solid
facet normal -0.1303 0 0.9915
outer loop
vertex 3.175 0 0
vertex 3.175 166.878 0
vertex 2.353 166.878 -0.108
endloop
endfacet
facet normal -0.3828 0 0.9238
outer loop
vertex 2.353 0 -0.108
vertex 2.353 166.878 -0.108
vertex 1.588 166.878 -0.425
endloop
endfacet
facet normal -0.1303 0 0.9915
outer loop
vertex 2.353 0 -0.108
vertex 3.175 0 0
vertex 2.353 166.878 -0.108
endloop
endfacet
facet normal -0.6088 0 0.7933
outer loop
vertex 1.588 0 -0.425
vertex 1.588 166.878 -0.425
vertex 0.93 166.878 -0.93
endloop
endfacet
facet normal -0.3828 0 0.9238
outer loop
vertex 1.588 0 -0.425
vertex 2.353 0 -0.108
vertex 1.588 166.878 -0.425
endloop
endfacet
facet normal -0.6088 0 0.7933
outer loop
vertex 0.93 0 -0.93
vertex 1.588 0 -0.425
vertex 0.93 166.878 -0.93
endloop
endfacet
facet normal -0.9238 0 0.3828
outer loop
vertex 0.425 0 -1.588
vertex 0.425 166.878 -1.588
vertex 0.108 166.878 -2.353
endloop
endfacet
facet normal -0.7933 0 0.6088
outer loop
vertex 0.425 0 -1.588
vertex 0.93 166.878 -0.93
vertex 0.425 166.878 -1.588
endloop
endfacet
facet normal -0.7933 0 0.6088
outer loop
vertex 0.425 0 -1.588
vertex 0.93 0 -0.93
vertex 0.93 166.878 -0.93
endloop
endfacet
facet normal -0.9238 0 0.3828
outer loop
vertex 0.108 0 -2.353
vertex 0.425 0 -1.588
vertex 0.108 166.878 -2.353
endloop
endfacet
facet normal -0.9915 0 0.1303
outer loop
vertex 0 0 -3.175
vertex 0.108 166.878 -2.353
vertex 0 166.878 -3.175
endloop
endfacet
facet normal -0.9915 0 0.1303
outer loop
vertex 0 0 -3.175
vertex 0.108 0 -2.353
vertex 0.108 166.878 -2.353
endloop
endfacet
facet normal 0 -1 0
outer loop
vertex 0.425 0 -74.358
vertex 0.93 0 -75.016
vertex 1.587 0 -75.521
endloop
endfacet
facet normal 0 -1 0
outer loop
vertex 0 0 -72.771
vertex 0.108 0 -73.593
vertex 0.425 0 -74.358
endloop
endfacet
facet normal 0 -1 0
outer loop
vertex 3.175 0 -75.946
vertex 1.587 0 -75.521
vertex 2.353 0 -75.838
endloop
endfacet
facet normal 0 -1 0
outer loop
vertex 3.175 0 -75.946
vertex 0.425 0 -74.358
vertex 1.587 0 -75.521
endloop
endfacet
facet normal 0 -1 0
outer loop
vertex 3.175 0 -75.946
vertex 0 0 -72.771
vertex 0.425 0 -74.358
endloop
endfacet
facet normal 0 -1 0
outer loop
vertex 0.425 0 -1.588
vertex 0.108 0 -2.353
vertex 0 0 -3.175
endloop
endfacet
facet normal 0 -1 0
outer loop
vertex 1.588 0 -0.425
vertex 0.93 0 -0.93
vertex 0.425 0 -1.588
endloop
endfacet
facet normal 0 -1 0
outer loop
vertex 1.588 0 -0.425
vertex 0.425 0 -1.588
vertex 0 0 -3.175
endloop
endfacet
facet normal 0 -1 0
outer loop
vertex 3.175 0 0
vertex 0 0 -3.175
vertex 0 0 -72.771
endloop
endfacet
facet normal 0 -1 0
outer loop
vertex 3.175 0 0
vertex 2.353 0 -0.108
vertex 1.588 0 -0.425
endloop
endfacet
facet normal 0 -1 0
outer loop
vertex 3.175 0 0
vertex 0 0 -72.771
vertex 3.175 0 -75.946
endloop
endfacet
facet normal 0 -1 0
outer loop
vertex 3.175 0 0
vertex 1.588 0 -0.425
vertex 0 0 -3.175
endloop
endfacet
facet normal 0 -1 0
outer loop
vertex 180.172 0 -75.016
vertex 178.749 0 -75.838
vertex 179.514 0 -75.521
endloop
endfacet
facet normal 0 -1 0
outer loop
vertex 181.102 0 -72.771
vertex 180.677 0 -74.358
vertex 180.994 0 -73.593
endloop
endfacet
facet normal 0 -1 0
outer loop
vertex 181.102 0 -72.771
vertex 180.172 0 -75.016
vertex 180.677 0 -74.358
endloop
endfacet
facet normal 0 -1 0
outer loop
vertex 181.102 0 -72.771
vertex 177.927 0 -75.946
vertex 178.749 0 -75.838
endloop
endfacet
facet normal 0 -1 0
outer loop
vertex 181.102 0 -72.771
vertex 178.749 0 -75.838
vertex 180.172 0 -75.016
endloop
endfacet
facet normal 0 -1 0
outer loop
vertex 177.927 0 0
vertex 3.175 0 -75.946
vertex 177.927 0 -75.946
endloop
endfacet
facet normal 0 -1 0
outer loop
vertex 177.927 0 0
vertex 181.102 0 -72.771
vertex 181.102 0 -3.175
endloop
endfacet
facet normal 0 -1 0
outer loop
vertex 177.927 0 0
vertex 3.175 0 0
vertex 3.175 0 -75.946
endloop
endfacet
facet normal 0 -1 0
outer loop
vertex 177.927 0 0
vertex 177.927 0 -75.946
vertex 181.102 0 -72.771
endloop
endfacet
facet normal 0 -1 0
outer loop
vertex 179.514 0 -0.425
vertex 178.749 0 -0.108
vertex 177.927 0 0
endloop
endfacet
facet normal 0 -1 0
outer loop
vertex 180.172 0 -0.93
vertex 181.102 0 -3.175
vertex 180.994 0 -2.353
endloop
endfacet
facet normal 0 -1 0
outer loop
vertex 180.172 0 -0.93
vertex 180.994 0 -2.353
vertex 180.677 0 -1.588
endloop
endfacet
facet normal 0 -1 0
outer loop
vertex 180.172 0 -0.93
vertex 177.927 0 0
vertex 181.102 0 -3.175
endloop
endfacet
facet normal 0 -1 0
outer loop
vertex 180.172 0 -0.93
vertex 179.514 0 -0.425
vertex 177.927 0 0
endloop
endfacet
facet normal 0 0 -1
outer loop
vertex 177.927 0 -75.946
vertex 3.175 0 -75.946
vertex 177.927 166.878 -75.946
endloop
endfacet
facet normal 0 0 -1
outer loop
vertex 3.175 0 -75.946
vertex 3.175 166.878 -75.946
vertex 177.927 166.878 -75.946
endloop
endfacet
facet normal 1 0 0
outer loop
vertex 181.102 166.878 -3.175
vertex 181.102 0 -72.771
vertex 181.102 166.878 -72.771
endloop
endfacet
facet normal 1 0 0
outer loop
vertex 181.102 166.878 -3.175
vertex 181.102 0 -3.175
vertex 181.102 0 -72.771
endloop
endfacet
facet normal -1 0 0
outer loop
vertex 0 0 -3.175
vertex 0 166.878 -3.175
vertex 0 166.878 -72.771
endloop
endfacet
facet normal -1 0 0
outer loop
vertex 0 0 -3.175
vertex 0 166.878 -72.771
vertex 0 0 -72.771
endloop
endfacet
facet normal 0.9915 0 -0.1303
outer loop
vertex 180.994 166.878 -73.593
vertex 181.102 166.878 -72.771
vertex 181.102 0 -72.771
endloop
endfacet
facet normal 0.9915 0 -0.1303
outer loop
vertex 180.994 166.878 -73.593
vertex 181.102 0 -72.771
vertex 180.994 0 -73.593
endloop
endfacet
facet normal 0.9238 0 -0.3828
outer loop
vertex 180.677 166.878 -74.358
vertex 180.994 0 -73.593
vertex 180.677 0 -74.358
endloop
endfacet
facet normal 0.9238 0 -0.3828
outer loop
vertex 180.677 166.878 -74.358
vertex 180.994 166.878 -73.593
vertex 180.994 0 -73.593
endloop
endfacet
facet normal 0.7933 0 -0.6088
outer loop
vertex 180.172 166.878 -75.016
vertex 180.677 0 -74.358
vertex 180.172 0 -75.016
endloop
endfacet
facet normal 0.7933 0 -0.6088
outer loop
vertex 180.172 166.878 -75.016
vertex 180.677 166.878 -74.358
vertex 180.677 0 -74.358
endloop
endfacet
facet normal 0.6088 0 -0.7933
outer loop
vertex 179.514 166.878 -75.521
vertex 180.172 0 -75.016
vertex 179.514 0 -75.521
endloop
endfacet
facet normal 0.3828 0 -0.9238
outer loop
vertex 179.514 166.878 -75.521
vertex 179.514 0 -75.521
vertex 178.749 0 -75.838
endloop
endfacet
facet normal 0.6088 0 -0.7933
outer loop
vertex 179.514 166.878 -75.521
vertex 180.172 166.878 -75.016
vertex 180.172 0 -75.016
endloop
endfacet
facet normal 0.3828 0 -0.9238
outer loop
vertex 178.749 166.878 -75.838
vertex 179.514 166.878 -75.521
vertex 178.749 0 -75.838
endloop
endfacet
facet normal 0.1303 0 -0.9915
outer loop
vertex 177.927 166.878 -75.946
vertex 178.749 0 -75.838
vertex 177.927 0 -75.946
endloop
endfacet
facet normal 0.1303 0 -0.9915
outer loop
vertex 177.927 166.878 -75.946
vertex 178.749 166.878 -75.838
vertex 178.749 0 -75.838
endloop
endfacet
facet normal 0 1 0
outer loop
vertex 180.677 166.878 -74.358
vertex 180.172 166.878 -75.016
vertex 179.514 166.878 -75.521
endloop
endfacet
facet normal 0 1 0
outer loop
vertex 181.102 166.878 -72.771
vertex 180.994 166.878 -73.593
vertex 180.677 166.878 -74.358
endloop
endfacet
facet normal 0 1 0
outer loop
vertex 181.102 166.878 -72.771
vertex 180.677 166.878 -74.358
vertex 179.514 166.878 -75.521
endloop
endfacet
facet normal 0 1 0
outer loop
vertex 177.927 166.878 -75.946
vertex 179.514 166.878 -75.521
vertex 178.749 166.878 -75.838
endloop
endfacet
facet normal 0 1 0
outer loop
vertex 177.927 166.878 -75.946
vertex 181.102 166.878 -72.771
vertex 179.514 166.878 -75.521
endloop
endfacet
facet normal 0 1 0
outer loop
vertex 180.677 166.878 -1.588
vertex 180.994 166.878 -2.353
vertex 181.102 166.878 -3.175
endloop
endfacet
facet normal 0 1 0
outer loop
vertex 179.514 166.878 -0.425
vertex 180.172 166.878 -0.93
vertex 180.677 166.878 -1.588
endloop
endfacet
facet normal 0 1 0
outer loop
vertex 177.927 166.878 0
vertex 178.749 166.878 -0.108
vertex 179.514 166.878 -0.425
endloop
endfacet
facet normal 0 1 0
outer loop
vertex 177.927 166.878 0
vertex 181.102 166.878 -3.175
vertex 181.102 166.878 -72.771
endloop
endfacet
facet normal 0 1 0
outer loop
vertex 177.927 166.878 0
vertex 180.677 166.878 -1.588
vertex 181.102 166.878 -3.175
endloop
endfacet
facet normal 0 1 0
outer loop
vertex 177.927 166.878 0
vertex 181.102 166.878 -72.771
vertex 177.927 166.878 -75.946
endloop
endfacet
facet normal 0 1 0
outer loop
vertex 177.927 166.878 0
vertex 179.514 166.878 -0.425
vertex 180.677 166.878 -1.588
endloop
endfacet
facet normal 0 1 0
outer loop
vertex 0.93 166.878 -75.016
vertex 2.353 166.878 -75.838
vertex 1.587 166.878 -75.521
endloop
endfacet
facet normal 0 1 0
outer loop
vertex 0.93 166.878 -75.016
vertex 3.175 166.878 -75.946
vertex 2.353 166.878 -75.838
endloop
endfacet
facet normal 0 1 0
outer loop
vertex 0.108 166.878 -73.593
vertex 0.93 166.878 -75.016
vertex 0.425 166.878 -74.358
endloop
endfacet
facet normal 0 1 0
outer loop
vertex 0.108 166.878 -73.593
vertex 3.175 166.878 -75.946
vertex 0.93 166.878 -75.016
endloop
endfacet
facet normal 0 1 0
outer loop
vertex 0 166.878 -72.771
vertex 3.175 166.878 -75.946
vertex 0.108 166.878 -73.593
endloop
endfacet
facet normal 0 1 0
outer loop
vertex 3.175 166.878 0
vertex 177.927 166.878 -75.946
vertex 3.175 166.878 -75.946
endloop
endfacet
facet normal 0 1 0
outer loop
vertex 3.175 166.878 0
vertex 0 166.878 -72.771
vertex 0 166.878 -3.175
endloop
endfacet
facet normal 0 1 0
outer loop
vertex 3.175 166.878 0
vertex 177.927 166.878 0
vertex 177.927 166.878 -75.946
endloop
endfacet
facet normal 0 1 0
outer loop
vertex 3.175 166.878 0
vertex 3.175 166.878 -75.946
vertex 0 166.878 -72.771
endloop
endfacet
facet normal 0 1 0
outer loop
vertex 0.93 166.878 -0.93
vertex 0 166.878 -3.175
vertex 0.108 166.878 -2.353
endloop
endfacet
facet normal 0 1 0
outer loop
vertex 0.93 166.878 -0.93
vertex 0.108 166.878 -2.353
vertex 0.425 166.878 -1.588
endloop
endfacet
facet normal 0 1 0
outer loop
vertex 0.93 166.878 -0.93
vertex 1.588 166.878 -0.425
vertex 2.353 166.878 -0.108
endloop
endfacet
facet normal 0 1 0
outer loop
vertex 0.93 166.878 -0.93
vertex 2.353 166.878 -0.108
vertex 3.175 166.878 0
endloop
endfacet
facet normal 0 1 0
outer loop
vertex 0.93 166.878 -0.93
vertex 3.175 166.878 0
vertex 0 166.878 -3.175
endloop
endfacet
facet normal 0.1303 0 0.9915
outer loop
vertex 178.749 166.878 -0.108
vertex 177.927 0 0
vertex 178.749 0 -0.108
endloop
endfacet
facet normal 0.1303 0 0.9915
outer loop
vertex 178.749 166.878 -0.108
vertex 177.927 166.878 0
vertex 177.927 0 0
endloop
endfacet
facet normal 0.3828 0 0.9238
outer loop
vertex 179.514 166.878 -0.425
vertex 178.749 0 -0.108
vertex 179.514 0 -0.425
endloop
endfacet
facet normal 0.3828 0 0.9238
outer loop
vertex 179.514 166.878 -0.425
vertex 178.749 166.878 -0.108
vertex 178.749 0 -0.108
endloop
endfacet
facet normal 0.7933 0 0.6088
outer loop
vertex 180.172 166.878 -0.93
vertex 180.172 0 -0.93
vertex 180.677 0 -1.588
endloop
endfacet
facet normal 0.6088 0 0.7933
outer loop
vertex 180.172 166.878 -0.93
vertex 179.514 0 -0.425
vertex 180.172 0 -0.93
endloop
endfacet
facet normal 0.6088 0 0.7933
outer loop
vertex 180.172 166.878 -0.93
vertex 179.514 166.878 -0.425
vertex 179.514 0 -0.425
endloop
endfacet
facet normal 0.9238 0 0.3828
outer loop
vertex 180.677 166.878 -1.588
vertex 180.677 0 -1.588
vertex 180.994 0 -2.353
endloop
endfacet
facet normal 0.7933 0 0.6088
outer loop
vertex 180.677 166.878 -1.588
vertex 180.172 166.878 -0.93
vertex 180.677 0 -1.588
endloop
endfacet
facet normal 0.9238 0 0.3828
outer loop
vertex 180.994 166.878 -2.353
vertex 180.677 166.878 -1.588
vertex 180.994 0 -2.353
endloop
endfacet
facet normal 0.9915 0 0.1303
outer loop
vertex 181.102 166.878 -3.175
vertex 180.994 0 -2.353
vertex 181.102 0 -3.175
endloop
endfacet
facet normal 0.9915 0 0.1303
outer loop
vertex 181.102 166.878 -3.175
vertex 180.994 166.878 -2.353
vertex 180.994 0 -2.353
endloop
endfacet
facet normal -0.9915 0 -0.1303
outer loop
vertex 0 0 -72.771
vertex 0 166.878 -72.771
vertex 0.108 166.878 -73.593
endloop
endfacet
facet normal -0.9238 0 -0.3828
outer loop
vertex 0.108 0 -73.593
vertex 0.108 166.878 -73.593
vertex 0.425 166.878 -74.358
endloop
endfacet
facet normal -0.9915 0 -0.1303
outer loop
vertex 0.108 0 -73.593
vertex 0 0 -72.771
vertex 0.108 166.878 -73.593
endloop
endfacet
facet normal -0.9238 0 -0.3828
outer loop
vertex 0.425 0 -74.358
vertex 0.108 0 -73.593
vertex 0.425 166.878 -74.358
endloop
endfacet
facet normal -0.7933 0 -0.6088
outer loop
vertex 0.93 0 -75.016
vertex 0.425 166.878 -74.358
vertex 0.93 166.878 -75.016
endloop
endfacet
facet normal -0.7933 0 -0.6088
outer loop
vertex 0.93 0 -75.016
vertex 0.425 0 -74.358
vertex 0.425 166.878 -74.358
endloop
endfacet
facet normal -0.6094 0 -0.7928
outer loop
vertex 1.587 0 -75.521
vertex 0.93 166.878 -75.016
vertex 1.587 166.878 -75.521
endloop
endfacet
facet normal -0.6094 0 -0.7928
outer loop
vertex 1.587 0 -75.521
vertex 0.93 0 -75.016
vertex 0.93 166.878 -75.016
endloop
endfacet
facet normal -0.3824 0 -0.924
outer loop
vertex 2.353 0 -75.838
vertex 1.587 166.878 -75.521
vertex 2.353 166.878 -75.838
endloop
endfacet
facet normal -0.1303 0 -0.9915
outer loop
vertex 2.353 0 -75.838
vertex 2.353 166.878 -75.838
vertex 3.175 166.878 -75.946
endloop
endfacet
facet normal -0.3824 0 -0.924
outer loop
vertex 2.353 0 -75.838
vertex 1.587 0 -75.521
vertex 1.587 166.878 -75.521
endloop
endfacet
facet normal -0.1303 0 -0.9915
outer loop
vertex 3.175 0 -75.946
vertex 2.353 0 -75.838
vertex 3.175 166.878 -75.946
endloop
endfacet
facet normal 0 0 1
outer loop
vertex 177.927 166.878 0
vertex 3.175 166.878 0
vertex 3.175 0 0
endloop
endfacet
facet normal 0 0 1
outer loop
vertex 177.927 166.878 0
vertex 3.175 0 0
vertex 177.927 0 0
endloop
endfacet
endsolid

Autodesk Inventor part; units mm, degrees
ref_plane "YZ Plane" through (0, 0, 0) normal (1, 0, 0) x (0, 1, 0)
ref_plane "XZ Plane" through (0, 0, 0) normal (0, 1, 0) x (-1, 0, 0)
ref_plane "XY Plane" through (0, 0, 0) normal (0, 0, 1) x (1, 0, 0)
sketch "Sketch1" plane through (0, 0, 0) normal (0, 0, 1) x (1, 0, 0)
  line L0 (0, 0) -> (181.102, 0)
  line L1 (181.102, 0) -> (181.102, 166.878)
  line L2 (181.102, 166.878) -> (0, 166.878)
  line L3 (0, 166.878) -> (0, 0)
  dimension "d0" = 181.102
  dimension "d1" = 166.878
extrude "Extrusion1" add sketch "Sketch1" against normal blind 75.946
fillet "Fillet1" radius 3.175 4 edges at (0, 83.439, 0) (181.102, 83.439, 0) (181.102, 83.439, -75.946) (0, 83.439, -75.946)
properties part number "Battery(Raw)"
